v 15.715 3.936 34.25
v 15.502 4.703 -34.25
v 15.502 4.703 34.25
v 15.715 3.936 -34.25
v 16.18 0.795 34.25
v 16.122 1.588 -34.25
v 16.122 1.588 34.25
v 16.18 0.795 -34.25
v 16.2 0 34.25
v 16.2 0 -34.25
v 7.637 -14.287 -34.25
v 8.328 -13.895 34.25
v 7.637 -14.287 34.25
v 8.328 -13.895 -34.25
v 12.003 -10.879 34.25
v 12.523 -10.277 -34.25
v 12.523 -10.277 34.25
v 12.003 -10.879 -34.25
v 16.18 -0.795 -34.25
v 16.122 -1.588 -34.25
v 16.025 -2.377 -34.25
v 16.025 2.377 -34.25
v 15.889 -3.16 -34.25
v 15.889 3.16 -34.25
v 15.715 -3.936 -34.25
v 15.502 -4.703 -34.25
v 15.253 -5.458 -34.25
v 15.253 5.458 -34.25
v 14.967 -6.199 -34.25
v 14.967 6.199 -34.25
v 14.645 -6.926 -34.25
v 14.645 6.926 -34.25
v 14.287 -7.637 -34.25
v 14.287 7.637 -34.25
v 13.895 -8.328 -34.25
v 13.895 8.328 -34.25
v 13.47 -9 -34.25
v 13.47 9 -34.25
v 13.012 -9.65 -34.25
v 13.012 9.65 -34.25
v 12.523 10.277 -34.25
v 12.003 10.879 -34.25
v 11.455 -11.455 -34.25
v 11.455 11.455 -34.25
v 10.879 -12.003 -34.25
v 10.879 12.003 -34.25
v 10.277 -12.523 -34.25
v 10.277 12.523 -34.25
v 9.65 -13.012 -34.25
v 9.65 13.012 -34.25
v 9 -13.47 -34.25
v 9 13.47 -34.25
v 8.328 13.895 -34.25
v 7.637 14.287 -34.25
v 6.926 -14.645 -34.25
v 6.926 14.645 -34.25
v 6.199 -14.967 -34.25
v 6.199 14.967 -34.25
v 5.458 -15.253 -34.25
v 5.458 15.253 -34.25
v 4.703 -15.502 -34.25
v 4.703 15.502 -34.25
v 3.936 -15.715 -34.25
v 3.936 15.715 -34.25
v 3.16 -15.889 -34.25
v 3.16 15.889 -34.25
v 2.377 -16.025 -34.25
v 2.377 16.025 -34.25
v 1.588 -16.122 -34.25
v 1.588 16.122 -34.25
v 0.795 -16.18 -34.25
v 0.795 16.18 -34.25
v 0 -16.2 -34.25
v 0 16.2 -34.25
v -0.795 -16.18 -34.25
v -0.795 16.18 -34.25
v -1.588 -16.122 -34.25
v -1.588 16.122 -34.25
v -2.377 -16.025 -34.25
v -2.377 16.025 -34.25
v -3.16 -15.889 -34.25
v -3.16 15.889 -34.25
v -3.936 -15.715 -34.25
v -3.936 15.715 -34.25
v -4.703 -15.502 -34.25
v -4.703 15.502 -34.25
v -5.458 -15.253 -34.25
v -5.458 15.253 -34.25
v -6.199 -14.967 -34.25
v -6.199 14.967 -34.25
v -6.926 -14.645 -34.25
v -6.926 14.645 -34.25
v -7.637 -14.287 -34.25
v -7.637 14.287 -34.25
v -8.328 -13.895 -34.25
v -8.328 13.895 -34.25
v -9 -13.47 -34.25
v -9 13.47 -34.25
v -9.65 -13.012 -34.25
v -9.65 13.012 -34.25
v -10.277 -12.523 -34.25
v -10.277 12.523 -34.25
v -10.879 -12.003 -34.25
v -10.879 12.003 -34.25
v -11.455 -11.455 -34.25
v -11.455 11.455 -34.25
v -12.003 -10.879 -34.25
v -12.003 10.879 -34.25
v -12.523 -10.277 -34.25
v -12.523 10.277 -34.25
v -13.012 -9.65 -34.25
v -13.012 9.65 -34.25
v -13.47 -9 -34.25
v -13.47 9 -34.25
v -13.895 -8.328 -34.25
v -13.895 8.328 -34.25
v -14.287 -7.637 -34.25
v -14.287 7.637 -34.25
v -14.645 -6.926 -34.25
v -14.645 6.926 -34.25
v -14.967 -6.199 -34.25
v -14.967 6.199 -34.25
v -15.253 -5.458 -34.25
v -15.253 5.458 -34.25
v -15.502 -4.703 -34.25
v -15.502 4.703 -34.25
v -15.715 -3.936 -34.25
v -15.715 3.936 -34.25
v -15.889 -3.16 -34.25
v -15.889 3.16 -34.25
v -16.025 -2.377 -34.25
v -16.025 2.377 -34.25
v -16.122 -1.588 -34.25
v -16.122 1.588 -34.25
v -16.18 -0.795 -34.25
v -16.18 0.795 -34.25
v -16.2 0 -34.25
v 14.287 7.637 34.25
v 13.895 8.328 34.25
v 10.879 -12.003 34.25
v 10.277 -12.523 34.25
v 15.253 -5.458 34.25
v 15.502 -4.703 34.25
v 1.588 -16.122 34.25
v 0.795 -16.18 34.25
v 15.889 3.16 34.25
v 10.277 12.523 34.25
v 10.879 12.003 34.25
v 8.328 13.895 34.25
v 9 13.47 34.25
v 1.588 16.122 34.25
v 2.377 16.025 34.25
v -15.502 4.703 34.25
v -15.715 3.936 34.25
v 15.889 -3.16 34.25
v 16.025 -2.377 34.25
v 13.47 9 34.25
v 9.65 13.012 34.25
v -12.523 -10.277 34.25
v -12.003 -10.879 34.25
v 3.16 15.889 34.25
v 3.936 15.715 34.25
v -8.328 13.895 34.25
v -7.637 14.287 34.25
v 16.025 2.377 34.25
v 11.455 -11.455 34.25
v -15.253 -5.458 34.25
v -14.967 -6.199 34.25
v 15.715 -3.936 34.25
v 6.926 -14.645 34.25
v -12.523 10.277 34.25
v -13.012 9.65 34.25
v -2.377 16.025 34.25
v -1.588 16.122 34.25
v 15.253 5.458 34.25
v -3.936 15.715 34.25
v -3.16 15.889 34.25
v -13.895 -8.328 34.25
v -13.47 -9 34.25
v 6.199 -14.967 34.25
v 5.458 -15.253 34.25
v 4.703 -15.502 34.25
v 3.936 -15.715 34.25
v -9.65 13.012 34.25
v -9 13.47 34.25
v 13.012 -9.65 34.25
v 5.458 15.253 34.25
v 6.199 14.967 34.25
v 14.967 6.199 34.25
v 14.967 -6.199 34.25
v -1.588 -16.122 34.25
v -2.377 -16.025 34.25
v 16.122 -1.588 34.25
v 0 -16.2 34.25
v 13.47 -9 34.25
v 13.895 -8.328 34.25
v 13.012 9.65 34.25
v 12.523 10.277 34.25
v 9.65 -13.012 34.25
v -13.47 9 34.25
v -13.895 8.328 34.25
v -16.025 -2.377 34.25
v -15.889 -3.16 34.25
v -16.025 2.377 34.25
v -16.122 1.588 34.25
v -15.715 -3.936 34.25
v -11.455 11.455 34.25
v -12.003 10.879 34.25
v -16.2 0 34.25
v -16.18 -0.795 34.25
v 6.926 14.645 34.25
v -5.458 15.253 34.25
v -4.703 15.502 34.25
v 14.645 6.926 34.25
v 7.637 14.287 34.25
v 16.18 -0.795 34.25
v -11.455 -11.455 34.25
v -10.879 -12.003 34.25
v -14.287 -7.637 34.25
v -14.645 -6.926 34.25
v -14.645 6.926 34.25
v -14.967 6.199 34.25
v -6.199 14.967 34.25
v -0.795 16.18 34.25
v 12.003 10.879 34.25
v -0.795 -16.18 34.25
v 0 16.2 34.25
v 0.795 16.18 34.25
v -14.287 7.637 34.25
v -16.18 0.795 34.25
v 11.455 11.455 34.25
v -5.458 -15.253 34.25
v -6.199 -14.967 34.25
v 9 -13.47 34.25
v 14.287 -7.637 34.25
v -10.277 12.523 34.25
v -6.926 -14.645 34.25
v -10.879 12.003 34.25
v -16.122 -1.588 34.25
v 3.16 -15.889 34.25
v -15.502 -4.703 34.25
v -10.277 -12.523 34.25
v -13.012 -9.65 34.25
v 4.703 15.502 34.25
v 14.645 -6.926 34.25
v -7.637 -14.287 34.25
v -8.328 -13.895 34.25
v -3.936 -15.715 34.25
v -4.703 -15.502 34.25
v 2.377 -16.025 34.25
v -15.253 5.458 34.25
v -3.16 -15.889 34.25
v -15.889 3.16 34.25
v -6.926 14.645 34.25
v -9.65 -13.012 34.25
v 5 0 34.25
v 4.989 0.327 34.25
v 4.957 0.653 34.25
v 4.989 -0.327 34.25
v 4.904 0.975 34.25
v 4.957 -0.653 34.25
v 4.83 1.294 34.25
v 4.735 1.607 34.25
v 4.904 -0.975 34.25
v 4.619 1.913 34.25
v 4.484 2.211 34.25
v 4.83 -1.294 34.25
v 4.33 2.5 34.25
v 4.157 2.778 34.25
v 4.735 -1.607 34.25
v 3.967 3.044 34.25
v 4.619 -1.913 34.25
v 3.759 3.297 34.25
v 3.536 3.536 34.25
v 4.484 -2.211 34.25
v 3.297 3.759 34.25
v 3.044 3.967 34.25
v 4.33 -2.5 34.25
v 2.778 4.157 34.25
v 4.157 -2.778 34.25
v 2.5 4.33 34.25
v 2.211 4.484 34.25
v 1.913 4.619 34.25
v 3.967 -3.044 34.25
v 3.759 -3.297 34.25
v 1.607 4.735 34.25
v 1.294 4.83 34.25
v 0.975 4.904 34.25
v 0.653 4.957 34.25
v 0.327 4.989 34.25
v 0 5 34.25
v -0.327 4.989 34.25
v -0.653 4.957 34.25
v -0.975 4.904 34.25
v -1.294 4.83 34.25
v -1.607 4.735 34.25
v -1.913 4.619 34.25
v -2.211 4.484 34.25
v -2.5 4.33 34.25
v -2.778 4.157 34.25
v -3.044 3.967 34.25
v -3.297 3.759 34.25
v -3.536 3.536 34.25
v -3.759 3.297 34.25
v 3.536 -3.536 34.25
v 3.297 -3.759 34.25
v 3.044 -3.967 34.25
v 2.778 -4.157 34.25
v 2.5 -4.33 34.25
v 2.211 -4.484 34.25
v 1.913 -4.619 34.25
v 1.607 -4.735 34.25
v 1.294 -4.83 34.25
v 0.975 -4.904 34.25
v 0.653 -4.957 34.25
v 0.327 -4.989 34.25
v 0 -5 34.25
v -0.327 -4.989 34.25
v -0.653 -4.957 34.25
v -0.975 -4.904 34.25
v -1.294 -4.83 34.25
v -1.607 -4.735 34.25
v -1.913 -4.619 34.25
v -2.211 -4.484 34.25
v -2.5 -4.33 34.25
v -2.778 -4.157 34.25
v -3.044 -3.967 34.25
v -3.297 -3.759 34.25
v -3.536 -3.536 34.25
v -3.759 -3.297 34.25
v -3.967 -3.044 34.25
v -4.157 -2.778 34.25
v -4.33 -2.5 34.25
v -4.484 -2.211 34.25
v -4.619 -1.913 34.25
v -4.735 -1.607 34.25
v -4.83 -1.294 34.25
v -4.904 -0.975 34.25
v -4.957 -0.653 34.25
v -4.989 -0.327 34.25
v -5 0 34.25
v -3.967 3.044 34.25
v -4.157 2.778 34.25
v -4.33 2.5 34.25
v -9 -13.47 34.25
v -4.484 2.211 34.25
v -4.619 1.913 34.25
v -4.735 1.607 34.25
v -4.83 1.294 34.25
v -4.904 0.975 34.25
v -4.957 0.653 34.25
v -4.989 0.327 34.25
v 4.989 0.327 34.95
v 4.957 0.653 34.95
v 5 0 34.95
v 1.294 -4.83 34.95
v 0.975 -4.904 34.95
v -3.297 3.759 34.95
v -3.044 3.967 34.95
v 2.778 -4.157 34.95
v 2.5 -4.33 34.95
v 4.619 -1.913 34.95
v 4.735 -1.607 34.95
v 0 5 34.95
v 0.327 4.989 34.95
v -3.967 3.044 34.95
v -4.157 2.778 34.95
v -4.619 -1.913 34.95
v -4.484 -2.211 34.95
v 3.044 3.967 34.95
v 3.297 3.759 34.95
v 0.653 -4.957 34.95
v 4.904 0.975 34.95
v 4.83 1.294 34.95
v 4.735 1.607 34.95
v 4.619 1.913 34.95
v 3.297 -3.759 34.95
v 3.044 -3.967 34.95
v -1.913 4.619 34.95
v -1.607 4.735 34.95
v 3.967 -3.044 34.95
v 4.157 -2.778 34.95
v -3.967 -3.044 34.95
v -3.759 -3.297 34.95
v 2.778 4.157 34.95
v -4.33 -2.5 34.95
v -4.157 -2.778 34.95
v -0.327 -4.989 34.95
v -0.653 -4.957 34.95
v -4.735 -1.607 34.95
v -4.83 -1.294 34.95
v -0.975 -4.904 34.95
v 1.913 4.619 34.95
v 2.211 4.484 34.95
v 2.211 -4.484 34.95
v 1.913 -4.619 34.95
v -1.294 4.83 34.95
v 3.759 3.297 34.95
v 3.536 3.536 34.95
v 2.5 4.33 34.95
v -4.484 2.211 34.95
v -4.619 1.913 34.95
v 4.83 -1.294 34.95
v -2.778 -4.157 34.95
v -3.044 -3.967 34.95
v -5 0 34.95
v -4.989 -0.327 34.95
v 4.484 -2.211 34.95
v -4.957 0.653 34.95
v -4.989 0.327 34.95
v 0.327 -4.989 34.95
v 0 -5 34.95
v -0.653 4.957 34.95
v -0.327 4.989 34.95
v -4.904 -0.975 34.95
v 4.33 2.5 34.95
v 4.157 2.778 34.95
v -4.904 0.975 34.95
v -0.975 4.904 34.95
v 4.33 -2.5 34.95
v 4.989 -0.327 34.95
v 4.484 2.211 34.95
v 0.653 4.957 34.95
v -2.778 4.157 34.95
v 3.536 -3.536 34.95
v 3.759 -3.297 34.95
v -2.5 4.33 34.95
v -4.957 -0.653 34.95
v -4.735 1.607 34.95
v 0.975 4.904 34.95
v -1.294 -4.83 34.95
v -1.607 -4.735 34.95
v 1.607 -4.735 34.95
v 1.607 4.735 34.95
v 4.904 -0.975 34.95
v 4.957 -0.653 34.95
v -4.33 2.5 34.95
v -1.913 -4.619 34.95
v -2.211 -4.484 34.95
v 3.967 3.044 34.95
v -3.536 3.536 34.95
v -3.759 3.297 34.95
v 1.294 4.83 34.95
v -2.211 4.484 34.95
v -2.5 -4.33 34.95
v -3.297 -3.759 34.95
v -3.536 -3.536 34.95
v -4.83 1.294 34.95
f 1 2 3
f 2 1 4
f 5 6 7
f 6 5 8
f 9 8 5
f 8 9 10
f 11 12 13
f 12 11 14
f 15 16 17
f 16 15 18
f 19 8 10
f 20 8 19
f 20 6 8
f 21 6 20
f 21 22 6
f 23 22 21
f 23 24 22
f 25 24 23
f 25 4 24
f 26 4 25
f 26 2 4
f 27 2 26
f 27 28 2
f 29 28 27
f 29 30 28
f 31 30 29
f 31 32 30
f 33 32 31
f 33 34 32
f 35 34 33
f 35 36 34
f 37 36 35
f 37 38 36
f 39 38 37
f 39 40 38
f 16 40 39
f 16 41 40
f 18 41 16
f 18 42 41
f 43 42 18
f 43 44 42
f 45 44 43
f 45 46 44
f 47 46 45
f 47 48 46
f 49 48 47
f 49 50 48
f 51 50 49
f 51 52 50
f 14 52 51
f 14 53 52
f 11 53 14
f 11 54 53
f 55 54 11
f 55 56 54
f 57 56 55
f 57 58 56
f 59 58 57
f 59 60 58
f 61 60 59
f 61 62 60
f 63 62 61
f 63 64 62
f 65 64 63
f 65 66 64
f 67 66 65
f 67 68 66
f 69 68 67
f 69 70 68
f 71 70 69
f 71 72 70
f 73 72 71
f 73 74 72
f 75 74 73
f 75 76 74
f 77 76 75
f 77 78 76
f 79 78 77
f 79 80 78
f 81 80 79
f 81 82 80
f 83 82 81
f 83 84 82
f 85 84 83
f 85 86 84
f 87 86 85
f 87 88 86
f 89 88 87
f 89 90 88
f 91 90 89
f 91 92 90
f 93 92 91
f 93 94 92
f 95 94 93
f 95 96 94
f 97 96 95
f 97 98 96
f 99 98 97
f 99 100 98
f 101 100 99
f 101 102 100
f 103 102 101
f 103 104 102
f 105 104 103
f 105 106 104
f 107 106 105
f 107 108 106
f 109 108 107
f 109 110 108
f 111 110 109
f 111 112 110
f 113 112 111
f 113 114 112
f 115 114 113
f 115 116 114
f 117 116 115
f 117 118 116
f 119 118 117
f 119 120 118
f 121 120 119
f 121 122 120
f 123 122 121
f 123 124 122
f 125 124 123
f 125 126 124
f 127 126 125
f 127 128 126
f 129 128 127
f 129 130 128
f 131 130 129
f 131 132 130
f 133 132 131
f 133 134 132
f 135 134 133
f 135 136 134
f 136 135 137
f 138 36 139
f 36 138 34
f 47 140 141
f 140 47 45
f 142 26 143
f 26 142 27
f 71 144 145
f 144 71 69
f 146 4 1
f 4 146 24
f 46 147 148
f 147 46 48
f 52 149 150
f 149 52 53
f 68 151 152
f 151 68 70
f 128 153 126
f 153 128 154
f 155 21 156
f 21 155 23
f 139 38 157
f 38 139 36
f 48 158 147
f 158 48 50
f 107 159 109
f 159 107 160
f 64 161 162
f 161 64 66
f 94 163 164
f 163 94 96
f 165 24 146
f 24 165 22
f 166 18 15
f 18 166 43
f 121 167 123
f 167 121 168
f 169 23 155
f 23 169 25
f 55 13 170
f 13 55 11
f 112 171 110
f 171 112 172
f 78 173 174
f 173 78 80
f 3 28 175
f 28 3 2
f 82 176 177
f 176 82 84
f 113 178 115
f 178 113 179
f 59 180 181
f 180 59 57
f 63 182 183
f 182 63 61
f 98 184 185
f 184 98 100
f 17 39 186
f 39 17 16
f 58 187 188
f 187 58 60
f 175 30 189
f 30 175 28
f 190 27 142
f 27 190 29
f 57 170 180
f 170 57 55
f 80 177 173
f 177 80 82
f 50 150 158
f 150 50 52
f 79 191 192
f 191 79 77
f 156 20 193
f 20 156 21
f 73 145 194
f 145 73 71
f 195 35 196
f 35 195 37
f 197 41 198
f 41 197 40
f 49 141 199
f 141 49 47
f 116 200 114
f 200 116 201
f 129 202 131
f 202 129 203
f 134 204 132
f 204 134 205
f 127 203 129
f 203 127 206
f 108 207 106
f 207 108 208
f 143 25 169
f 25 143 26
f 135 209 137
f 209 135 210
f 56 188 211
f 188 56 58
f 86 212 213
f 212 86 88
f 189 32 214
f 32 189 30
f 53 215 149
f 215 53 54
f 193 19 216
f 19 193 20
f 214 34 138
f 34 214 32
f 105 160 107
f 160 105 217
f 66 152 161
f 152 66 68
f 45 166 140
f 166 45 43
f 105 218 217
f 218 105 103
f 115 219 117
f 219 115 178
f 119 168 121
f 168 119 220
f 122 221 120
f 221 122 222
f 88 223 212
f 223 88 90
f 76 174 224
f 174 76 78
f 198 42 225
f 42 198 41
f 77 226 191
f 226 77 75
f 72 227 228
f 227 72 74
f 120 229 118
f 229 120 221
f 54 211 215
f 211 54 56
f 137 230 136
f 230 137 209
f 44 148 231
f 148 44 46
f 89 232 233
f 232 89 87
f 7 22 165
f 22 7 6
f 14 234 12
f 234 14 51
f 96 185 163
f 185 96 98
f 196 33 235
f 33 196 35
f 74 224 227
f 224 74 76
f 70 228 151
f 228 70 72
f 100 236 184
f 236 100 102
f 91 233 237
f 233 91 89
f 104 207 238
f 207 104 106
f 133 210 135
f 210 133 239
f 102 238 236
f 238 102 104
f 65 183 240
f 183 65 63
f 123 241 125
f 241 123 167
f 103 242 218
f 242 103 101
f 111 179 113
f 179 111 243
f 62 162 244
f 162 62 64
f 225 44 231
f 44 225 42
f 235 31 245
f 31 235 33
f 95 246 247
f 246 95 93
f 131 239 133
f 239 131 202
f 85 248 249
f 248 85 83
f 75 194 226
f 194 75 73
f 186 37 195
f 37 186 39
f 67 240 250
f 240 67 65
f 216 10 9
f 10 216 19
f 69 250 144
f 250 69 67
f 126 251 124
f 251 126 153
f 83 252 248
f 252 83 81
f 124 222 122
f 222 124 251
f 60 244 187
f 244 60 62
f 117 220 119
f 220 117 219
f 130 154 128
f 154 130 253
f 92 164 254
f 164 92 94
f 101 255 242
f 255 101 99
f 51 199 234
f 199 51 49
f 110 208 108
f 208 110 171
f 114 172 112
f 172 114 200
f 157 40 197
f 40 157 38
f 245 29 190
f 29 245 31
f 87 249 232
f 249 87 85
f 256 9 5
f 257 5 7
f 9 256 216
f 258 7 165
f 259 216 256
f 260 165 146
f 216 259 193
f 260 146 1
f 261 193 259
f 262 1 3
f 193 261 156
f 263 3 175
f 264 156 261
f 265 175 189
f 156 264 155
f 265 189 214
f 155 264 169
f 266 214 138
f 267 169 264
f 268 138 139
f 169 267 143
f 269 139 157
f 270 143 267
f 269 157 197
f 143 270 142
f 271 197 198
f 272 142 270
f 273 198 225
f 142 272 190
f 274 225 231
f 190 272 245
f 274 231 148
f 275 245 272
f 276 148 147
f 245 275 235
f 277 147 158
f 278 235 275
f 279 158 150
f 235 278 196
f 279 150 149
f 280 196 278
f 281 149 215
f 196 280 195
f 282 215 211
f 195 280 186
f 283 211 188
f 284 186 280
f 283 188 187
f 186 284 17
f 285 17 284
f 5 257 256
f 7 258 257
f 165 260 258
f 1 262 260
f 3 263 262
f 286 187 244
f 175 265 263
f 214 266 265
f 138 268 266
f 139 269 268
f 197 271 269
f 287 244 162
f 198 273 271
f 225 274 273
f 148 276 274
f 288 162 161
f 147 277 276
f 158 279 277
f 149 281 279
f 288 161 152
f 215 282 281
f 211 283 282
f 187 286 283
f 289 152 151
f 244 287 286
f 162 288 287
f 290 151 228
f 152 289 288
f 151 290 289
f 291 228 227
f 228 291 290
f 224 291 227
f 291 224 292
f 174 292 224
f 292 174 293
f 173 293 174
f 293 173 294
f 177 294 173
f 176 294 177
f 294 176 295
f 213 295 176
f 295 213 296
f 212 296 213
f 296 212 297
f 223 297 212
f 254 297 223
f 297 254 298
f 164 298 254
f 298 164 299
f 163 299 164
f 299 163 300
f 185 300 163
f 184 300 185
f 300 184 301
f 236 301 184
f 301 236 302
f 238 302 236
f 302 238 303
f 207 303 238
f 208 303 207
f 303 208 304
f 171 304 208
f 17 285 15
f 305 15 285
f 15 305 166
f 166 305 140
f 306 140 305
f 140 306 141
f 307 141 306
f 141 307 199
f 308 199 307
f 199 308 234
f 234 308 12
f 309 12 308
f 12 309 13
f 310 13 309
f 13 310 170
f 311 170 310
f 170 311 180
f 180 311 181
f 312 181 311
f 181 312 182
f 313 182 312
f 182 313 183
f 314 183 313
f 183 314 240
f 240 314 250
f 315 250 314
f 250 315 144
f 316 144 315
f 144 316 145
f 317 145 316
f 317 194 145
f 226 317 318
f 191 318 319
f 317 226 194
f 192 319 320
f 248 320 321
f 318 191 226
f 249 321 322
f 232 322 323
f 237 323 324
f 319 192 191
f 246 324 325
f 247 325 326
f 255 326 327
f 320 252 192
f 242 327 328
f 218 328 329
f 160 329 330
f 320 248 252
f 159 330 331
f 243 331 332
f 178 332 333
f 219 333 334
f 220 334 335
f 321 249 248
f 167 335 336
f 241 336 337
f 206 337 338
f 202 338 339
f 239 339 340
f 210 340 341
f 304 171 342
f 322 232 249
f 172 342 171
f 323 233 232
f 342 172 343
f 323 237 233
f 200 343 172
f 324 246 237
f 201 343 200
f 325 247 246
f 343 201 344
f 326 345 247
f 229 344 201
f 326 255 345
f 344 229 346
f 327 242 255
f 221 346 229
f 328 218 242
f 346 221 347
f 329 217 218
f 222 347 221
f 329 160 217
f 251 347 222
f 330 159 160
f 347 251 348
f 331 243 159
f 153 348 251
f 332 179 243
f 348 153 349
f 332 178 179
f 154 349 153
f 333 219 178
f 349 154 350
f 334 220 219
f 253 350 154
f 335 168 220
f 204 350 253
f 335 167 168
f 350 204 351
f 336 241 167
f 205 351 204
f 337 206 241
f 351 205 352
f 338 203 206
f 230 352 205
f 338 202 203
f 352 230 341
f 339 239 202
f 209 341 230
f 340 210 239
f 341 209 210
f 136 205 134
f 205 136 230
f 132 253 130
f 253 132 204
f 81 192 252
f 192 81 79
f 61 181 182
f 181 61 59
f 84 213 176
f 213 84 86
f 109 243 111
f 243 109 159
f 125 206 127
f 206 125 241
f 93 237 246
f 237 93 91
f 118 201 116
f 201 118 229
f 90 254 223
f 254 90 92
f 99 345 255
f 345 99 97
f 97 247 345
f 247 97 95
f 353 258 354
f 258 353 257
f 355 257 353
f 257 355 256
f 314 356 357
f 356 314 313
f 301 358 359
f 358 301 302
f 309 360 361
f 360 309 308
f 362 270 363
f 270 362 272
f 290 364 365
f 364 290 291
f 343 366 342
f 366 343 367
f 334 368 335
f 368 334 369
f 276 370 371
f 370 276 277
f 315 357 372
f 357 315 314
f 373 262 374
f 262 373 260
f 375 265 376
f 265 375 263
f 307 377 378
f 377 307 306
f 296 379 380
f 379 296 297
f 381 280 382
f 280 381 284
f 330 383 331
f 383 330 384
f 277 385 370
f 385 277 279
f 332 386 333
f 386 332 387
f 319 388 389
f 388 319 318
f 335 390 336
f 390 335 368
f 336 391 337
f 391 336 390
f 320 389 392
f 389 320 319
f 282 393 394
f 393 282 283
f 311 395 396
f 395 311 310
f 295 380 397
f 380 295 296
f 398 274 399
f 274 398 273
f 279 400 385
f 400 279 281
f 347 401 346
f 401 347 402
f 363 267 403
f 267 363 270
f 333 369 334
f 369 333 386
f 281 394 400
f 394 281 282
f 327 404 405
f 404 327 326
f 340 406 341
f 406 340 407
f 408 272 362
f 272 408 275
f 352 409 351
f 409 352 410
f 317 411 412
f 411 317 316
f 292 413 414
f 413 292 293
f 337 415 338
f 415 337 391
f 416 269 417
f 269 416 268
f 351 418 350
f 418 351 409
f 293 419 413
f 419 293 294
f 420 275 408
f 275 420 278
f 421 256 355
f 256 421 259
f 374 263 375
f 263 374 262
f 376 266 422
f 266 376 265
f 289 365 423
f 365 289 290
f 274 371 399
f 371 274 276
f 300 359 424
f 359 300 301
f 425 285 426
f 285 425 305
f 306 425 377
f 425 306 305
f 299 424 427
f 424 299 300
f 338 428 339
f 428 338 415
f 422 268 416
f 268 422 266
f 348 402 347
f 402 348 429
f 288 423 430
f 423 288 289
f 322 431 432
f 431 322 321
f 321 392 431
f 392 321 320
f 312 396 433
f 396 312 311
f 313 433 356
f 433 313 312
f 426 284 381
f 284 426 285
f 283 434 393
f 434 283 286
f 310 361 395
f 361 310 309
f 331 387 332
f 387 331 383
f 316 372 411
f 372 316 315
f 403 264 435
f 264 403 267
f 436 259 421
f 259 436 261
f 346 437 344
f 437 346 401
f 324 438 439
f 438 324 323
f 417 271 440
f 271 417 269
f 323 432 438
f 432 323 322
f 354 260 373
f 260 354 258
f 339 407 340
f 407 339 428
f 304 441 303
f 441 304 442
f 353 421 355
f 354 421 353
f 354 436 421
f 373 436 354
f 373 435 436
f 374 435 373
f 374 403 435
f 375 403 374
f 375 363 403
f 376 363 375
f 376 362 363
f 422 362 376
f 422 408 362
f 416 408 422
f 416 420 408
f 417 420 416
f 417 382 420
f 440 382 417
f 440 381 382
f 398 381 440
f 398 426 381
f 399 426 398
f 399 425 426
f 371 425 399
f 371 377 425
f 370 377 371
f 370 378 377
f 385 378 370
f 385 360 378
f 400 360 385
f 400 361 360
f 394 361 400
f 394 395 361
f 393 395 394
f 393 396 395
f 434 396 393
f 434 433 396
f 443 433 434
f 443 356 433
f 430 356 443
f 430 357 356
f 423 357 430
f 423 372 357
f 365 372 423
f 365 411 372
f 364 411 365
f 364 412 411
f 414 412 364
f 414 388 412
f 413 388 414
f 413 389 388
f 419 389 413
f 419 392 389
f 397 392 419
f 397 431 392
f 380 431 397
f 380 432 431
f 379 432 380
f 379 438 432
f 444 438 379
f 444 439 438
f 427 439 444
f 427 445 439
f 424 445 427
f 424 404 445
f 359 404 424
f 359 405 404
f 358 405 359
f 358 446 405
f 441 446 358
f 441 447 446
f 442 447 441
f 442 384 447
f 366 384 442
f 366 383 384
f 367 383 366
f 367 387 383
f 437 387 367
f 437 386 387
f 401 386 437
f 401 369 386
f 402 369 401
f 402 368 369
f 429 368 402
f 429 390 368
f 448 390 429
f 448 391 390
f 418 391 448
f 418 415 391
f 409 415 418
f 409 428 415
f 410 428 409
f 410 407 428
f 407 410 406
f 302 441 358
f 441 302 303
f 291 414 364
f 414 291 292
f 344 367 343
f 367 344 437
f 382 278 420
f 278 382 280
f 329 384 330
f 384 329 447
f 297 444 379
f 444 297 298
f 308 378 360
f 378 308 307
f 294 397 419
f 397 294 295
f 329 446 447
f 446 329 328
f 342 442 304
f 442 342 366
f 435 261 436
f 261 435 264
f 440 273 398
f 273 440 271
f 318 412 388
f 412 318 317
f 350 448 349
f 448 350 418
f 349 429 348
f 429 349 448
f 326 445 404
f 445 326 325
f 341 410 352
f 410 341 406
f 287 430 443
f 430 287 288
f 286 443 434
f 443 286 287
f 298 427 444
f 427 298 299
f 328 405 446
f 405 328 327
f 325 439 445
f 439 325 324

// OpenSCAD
// Battery cell (single connected solid)
// Target overall: 70.2mm tall, 32.4mm diameter

height_mm = 70.2; //[35.1:140.4:0.1]
diameter_mm = 32.4; //[16.2:64.8:0.1]

positive_terminal_diameter_mm = 10; //[5:20:0.1]
positive_terminal_height_mm   = 1.5; //[0.75:3:0.05]

negative_terminal_diameter_mm = 12; //[6:24:0.1]
negative_terminal_height_mm   = 0.2; //[0.1:0.4:0.01]

overlap_mm = 0.8; //[0.5:2:0.1]

$fn = 128;

module battery_cell() {
    body_r = diameter_mm/2;

    // Keep overall height exactly height_mm by making the main body shorter
    body_h = height_mm - positive_terminal_height_mm - negative_terminal_height_mm;

    union() {
        // Main body centered at origin
        cylinder(h=body_h, r=body_r, center=true);

        // Positive terminal: sits on top of body, overlaps slightly into it
        translate([0, 0, body_h/2 + positive_terminal_height_mm/2 - overlap_mm])
            cylinder(h=positive_terminal_height_mm,
                     r=positive_terminal_diameter_mm/2,
                     center=true, $fn=96);

        // Negative terminal: sits on bottom of body, overlaps slightly into it
        translate([0, 0, -(body_h/2 + negative_terminal_height_mm/2 - overlap_mm)])
            cylinder(h=negative_terminal_height_mm,
                     r=negative_terminal_diameter_mm/2,
                     center=true, $fn=96);
    }
}

battery_cell();
